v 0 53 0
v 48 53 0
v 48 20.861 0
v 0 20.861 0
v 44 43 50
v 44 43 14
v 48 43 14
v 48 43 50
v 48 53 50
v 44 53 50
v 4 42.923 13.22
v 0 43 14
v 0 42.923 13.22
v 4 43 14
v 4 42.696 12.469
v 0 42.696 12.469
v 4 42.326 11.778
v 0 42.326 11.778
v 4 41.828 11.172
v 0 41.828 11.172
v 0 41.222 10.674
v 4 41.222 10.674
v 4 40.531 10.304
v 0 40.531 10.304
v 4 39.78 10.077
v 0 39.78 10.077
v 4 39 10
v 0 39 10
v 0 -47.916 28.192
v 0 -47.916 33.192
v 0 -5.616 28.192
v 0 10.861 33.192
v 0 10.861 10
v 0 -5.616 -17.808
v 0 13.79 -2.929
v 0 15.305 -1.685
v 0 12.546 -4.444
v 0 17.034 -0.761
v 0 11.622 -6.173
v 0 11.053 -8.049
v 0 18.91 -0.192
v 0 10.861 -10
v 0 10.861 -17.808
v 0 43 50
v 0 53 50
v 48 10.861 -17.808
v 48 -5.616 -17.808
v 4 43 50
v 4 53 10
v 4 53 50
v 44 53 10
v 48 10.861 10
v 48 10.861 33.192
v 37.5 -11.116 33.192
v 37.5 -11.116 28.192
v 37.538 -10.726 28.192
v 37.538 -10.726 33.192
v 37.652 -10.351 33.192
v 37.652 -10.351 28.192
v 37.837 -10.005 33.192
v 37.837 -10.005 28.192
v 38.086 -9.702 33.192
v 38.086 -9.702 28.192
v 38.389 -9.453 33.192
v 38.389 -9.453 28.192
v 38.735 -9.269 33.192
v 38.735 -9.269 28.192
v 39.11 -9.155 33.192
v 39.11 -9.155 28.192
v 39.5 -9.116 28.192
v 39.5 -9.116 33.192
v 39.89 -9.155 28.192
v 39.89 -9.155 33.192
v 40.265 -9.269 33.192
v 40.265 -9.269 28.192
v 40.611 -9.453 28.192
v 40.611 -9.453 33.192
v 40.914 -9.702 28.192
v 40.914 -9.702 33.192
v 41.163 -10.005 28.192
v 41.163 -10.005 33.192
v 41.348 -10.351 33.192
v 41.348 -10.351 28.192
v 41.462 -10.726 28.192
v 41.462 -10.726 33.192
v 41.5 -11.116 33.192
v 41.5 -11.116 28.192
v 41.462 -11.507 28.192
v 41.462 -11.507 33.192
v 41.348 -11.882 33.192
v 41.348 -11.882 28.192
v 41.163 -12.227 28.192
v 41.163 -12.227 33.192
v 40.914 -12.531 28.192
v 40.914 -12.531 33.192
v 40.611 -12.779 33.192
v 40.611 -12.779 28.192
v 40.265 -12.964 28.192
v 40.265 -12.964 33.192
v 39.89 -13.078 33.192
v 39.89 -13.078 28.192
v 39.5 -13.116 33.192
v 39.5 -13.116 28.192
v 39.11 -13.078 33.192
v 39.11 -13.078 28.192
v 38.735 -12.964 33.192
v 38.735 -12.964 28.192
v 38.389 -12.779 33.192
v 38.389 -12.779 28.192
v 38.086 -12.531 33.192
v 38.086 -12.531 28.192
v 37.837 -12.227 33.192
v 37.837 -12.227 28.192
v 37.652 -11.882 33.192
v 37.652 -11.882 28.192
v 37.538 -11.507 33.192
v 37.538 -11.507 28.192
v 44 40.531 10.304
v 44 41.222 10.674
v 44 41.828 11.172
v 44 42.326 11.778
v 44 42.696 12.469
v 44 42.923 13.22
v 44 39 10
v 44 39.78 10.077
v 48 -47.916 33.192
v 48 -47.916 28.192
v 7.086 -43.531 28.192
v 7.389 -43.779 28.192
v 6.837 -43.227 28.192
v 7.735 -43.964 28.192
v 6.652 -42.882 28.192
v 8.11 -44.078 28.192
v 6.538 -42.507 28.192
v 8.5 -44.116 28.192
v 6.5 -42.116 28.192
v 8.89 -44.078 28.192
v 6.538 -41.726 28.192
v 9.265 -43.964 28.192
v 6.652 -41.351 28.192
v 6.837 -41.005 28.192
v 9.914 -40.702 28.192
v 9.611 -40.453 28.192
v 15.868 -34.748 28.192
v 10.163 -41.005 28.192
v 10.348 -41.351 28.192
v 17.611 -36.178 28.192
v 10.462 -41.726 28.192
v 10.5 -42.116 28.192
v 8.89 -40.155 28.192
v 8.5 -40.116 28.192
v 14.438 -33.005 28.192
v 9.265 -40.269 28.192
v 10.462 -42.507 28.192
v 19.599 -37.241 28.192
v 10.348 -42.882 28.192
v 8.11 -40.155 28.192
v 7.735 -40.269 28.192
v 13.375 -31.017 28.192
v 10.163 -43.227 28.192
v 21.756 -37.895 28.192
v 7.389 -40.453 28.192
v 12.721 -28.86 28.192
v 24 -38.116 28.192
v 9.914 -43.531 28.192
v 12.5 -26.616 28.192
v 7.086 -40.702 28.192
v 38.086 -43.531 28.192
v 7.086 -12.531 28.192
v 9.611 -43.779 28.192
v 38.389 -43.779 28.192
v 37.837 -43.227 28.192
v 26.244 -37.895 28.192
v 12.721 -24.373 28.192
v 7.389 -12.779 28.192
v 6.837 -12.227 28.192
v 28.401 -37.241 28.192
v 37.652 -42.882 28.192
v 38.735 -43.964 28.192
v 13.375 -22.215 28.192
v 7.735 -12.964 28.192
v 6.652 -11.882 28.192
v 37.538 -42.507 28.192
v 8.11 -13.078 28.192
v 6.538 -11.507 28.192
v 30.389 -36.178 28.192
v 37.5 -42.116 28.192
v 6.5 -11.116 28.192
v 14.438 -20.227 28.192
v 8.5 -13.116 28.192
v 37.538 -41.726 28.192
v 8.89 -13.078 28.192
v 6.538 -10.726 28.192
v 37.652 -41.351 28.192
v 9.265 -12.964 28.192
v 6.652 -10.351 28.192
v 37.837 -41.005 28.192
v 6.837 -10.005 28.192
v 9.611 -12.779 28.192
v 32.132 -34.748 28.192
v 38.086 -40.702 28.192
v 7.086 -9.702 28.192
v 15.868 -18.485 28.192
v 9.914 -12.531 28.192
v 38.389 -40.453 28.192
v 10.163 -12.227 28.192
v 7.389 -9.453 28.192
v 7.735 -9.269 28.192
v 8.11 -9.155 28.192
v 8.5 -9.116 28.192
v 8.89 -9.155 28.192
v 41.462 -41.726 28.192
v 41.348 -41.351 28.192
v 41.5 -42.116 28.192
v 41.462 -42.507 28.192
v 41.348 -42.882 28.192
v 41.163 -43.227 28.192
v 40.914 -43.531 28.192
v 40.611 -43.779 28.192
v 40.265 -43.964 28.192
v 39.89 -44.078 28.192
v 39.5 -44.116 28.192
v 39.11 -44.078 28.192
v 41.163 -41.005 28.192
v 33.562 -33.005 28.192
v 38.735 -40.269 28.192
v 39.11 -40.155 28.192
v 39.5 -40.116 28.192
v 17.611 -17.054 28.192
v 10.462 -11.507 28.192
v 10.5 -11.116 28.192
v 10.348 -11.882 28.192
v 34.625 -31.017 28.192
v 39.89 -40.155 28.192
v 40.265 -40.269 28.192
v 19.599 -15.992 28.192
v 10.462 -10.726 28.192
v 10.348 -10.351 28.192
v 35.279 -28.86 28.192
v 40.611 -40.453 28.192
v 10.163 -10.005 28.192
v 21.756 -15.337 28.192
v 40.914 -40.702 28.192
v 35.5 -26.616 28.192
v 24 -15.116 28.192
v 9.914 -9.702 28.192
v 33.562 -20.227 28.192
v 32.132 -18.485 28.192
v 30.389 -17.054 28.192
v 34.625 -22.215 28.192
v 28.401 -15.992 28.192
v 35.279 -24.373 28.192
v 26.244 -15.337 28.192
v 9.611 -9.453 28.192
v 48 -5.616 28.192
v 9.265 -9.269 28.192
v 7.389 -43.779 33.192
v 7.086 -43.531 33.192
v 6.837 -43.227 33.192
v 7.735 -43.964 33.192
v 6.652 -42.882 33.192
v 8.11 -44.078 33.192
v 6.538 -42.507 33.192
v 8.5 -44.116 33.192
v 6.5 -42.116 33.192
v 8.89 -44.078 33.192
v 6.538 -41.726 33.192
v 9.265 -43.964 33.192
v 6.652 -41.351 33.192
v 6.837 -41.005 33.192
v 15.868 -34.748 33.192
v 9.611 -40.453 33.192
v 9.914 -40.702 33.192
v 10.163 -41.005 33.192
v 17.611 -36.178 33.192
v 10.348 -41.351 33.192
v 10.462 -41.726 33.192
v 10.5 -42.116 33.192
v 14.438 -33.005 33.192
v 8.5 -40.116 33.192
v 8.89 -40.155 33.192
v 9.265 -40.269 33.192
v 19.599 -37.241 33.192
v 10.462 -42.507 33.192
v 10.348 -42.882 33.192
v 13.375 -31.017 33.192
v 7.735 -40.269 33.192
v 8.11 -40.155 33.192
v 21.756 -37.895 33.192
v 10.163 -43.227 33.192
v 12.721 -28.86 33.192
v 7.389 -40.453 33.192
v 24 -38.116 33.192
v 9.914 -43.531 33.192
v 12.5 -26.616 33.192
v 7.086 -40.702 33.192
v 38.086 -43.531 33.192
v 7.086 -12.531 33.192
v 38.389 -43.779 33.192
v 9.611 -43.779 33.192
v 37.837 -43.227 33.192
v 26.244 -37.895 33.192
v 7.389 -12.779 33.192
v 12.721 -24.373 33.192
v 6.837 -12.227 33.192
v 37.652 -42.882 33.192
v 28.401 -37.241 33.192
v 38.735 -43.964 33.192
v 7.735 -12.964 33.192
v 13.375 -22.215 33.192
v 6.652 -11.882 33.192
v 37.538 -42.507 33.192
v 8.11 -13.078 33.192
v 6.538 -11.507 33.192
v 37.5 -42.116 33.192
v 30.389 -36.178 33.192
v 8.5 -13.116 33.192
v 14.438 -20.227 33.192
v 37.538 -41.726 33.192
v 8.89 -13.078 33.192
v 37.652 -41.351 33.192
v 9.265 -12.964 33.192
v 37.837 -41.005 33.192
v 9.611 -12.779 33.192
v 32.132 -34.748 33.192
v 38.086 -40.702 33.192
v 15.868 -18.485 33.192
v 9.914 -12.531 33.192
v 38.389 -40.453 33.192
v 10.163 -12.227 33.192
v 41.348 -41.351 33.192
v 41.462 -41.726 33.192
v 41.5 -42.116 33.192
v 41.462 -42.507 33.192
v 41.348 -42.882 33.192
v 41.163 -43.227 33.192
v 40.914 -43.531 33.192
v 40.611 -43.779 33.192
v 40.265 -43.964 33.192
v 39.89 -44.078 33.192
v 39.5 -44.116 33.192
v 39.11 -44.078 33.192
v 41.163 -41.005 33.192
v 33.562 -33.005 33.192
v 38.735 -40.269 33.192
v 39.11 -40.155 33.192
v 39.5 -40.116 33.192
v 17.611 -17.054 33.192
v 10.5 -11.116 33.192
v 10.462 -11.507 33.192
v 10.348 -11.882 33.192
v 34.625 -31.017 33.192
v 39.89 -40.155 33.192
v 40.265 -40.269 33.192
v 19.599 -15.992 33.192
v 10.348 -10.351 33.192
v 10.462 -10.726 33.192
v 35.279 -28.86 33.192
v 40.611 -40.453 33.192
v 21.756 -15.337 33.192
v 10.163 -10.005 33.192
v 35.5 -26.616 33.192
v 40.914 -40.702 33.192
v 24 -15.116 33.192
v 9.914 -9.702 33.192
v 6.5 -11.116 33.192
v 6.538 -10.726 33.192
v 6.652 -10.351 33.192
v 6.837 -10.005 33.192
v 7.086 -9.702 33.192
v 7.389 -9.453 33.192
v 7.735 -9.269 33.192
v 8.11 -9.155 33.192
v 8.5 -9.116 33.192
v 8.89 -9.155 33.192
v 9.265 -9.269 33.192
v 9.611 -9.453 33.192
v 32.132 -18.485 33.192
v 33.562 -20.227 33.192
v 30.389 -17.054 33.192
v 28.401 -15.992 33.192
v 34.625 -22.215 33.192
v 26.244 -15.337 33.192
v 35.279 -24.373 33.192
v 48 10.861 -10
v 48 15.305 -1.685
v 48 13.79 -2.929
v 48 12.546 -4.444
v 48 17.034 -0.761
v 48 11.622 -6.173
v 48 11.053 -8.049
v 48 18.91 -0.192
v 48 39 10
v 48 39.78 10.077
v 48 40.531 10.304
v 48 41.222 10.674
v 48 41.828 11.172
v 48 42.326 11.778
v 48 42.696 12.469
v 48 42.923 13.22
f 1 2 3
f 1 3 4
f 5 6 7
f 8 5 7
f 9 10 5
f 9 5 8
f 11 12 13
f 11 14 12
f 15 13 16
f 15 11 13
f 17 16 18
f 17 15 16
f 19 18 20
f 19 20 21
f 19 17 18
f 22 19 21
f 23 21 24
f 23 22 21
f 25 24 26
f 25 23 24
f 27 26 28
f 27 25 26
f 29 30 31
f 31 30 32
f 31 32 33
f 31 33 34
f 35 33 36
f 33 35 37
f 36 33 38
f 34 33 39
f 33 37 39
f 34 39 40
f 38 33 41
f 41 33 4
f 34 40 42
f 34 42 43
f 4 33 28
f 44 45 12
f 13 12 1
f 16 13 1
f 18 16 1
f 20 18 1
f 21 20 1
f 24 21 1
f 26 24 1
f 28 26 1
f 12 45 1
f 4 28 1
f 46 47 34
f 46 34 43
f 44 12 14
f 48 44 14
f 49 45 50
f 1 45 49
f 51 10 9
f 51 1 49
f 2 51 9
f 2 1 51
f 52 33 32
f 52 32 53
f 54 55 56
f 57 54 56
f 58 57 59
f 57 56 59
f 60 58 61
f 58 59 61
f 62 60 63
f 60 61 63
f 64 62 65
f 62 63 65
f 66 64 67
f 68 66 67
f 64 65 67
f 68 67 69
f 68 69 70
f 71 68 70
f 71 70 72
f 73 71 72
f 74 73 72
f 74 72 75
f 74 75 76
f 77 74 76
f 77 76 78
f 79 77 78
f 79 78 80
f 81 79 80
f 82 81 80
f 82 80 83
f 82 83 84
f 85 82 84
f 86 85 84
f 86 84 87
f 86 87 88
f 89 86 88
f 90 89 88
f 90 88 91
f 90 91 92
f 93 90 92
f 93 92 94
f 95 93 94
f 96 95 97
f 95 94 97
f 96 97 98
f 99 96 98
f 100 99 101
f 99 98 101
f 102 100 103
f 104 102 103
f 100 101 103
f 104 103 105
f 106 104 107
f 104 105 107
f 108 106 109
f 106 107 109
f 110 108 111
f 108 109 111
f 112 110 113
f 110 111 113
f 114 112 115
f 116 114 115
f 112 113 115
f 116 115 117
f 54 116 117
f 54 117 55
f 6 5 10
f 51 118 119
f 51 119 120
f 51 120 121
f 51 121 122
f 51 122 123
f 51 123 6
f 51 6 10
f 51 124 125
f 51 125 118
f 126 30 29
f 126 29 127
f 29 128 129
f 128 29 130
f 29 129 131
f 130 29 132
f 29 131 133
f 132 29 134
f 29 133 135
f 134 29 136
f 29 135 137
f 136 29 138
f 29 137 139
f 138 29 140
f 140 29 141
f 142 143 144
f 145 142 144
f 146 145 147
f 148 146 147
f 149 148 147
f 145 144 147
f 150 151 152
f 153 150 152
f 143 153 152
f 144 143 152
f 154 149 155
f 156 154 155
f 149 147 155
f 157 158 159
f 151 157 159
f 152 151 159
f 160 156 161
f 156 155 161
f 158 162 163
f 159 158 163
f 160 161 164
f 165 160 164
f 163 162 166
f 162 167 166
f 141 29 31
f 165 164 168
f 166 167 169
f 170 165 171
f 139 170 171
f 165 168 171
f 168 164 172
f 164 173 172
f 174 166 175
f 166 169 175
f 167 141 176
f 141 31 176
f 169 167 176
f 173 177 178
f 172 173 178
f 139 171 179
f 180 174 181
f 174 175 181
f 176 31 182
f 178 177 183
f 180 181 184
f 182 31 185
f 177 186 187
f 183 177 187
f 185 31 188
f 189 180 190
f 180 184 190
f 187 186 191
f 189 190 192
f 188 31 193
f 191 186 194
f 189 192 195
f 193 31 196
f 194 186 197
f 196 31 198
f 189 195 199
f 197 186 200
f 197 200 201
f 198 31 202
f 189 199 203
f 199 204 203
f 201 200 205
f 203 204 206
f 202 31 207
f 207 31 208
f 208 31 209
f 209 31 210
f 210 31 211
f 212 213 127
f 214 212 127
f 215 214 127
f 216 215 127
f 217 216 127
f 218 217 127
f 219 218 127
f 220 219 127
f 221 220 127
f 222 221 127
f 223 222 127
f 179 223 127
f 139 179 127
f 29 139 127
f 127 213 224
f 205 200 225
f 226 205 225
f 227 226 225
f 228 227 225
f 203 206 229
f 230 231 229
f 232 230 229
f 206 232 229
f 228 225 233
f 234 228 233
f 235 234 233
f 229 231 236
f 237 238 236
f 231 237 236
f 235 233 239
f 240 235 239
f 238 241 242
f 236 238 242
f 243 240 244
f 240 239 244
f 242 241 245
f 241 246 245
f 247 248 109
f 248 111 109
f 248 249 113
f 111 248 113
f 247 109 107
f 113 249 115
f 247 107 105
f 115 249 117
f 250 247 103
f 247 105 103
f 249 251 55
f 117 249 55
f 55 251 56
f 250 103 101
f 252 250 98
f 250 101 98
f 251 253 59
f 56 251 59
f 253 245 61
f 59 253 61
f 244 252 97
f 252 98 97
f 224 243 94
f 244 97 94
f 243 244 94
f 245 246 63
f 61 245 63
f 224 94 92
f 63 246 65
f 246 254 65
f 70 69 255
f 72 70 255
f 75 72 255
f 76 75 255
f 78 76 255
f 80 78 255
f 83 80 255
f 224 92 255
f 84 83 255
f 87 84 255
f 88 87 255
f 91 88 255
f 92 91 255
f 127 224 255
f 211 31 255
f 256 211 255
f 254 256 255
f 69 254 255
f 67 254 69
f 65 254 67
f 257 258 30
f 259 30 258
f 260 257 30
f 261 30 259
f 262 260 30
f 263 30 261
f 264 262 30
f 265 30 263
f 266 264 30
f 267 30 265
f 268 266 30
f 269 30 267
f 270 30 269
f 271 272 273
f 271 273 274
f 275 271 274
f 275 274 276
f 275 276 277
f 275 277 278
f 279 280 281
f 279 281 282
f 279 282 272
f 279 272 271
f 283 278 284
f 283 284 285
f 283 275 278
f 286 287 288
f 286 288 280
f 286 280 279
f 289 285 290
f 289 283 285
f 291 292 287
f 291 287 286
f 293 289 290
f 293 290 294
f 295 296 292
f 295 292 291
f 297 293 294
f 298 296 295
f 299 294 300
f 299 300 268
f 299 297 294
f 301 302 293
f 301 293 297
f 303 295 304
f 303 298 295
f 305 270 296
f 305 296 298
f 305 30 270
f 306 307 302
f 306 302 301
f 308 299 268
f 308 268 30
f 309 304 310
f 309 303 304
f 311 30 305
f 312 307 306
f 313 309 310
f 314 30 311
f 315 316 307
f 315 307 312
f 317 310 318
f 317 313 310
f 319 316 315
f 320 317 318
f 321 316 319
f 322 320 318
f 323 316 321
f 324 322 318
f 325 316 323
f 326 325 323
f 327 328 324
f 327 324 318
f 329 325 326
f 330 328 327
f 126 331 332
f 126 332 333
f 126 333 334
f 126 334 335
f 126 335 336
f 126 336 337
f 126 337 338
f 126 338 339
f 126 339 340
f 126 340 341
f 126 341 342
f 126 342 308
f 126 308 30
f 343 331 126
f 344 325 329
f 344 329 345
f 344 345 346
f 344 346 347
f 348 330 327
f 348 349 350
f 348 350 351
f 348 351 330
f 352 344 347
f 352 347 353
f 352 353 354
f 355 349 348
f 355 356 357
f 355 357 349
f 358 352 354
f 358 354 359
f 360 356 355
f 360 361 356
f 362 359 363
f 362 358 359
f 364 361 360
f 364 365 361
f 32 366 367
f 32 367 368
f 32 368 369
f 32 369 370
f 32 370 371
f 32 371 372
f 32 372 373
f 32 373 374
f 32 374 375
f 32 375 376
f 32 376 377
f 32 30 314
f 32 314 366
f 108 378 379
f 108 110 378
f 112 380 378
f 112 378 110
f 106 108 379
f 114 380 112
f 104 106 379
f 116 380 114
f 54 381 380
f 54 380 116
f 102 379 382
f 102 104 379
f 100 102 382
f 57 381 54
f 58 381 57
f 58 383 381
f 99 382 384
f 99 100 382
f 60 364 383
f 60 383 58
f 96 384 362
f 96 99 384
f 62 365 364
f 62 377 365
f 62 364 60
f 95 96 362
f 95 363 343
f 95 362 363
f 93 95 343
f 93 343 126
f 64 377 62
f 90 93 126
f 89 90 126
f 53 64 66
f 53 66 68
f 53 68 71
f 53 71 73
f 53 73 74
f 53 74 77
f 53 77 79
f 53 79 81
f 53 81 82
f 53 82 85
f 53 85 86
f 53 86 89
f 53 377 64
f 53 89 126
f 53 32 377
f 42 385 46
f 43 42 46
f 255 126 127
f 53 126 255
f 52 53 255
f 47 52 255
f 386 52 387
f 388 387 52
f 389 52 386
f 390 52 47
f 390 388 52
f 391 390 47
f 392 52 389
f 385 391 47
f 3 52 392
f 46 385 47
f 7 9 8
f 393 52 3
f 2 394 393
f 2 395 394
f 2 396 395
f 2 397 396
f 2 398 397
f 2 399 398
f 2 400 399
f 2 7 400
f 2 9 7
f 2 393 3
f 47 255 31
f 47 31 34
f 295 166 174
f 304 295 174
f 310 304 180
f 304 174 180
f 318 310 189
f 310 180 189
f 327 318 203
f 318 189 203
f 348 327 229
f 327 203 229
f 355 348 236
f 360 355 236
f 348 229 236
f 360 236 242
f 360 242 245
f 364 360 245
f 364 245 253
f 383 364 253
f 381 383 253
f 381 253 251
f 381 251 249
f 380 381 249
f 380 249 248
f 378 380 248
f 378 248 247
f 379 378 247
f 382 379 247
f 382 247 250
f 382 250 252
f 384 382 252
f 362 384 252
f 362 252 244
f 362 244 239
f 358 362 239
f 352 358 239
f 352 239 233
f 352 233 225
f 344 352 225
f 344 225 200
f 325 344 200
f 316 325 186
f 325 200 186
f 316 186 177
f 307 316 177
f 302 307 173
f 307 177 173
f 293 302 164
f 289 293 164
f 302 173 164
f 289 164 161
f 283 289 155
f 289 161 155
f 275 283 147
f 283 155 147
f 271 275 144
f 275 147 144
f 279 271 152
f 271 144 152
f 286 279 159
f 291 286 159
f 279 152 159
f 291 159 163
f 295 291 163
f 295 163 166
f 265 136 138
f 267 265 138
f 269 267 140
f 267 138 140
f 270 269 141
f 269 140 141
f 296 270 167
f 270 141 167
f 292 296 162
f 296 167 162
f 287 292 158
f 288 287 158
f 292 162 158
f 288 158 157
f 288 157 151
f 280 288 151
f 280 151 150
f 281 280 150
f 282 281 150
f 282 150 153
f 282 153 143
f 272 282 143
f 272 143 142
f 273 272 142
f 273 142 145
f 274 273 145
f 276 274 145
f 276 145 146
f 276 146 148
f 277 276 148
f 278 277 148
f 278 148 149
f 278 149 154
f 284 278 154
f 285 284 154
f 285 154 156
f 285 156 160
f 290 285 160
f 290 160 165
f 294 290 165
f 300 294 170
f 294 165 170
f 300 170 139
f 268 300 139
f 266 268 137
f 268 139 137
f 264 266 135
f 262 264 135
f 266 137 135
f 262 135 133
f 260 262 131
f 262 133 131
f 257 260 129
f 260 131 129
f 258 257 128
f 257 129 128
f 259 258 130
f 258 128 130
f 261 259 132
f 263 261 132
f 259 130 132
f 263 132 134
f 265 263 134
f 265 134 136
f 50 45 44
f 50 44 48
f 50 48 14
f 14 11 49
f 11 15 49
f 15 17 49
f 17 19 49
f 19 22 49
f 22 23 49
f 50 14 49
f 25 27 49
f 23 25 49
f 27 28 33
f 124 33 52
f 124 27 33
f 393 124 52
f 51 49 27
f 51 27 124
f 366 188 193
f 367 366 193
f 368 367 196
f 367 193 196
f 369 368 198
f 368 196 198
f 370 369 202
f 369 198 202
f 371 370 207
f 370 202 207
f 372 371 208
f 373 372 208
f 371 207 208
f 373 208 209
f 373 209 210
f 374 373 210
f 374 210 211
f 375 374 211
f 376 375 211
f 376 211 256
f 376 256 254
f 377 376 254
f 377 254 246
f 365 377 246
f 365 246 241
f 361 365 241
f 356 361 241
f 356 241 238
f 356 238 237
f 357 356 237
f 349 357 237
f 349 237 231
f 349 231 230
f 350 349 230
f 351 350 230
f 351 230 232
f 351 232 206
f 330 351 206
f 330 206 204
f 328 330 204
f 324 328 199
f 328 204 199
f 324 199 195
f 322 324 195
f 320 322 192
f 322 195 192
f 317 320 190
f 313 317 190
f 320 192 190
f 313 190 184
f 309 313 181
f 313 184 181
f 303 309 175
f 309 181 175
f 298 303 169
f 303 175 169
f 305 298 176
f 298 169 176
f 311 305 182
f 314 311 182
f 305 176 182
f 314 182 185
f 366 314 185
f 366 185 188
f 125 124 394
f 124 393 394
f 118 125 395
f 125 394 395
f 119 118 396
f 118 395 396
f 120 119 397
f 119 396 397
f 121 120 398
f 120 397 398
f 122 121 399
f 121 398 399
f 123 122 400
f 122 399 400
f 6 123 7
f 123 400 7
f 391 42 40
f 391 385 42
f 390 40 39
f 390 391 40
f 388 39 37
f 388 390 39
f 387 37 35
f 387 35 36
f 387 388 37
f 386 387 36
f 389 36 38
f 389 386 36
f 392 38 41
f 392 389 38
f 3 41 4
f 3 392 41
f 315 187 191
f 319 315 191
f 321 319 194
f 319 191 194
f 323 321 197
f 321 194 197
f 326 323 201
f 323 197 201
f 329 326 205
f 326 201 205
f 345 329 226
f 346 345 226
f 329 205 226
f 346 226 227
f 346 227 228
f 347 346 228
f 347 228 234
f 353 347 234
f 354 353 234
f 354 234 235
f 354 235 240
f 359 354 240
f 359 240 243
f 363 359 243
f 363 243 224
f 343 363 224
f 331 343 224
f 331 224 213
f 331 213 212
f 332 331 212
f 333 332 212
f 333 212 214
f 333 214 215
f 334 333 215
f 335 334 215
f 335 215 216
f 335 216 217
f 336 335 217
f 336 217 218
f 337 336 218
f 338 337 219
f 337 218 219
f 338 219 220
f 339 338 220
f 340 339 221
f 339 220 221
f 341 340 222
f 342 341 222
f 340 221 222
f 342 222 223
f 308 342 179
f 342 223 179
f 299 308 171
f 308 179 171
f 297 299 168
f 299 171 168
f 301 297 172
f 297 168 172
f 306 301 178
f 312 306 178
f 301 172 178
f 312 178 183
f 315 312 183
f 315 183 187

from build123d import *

# Parameters (mm, degrees)
SKETCH1_W           = 48
SKETCH1_H           = 53
BOSS_EXTRUDE1_DEPTH = 10
SKETCH2_W           = 48
SKETCH2_H           = 5.616325
BOSS_EXTRUDE2_DEPTH = 33.1917878
SKETCH4_W           = 4
SKETCH4_H           = 10
BOSS_EXTRUDE4_DEPTH = 40
SKETCH5_W           = 48
SKETCH5_H           = 10.8609375
BOSS_EXTRUDE5_DEPTH = 23.1917878
SKETCH6_W           = 48
SKETCH6_H           = 5
BOSS_EXTRUDE6_DEPTH = 42.3
SKETCH7_W           = 12.8082122
SKETCH7_H           = 16.4772625
BOSS_EXTRUDE7_DEPTH = 48
CUT_EXTRUDE1_REACH  = 84.426
SKETCH8_R           = 11.5
SKETCH8_R_2         = 2
FILLET1_R           = 10
FILLET2_R           = 4
SKETCH9_W           = 5
SKETCH9_H           = 16.4772625
BOSS_EXTRUDE9_DEPTH = 48


with BuildPart() as part:
    # Sketch1 → Boss-Extrude1 (new body)
    with BuildSketch(Plane.XY):
        with Locations((24, 26.5)):
            Rectangle(SKETCH1_W, SKETCH1_H)
    extrude(amount=BOSS_EXTRUDE1_DEPTH)

    # Sketch2 → Boss-Extrude2 (add)
    with BuildSketch(Plane(origin=(0, 0, 0), x_dir=(-1, 0, 0), z_dir=(0, 0, -1))):
        with Locations((-24, -2.8081625)):
            Rectangle(SKETCH2_W, SKETCH2_H)
    extrude(amount=-BOSS_EXTRUDE2_DEPTH)

    # Sketch4 → Boss-Extrude4 (add)
    with BuildSketch(Plane.XY.offset(10)):
        with Locations((2, 48)):
            Rectangle(SKETCH4_W, SKETCH4_H)
        with Locations((46, 48)):
            Rectangle(SKETCH4_W, SKETCH4_H)
    extrude(amount=BOSS_EXTRUDE4_DEPTH)

    # Sketch5 → Boss-Extrude5 (add)
    with BuildSketch(Plane.XY.offset(10)):
        with Locations((24, 5.43046875)):
            Rectangle(SKETCH5_W, SKETCH5_H)
    extrude(amount=BOSS_EXTRUDE5_DEPTH)

    # Sketch6 → Boss-Extrude6 (add)
    with BuildSketch(Plane.XZ.offset(5.616325)):
        with Locations((24, 30.6917878)):
            Rectangle(SKETCH6_W, SKETCH6_H)
    extrude(amount=BOSS_EXTRUDE6_DEPTH)

    # Sketch7 → Boss-Extrude7 (add)
    with BuildSketch(Plane.ZY):
        with Locations((-6.4041061, 2.62230625)):
            Rectangle(SKETCH7_W, SKETCH7_H)
    extrude(amount=-BOSS_EXTRUDE7_DEPTH)

    # Sketch8 → Cut-Extrude1 (cut, up to next)
    with BuildSketch(Plane(origin=(0, 0, 28.1917878), x_dir=(-1, 0, 0), z_dir=(0, 0, -1)), mode=Mode.PRIVATE) as cut_extrude1_sk1:
        with Locations((-24, -26.616325)):
            Circle(SKETCH8_R)
    cut_extrude1_tool1 = extrude(cut_extrude1_sk1.sketch, amount=-CUT_EXTRUDE1_REACH, mode=Mode.PRIVATE) & part.part
    # Sketch8 → Cut-Extrude1 (cut, up to next)
    with BuildSketch(Plane(origin=(0, 0, 28.1917878), x_dir=(-1, 0, 0), z_dir=(0, 0, -1)), mode=Mode.PRIVATE) as cut_extrude1_sk2:
        with Locations((-39.5, -11.116325)):
            Circle(SKETCH8_R_2)
    cut_extrude1_tool2 = extrude(cut_extrude1_sk2.sketch, amount=-CUT_EXTRUDE1_REACH, mode=Mode.PRIVATE) & part.part
    # Sketch8 → Cut-Extrude1 (cut, up to next)
    with BuildSketch(Plane(origin=(0, 0, 28.1917878), x_dir=(-1, 0, 0), z_dir=(0, 0, -1)), mode=Mode.PRIVATE) as cut_extrude1_sk3:
        with Locations((-39.5, -42.116325)):
            Circle(SKETCH8_R_2)
    cut_extrude1_tool3 = extrude(cut_extrude1_sk3.sketch, amount=-CUT_EXTRUDE1_REACH, mode=Mode.PRIVATE) & part.part
    # Sketch8 → Cut-Extrude1 (cut, up to next)
    with BuildSketch(Plane(origin=(0, 0, 28.1917878), x_dir=(-1, 0, 0), z_dir=(0, 0, -1)), mode=Mode.PRIVATE) as cut_extrude1_sk4:
        with Locations((-8.5, -11.116325)):
            Circle(SKETCH8_R_2)
    cut_extrude1_tool4 = extrude(cut_extrude1_sk4.sketch, amount=-CUT_EXTRUDE1_REACH, mode=Mode.PRIVATE) & part.part
    # Sketch8 → Cut-Extrude1 (cut, up to next)
    with BuildSketch(Plane(origin=(0, 0, 28.1917878), x_dir=(-1, 0, 0), z_dir=(0, 0, -1)), mode=Mode.PRIVATE) as cut_extrude1_sk5:
        with Locations((-8.5, -42.116325)):
            Circle(SKETCH8_R_2)
    cut_extrude1_tool5 = extrude(cut_extrude1_sk5.sketch, amount=-CUT_EXTRUDE1_REACH, mode=Mode.PRIVATE) & part.part
    add(cut_extrude1_tool1.solids().sort_by_distance((24, -26.616325, 28.191788))[0], mode=Mode.SUBTRACT)
    add(cut_extrude1_tool2.solids().sort_by_distance((39.5, -11.116325, 28.191788))[0], mode=Mode.SUBTRACT)
    add(cut_extrude1_tool3.solids().sort_by_distance((39.5, -42.116325, 28.191788))[0], mode=Mode.SUBTRACT)
    add(cut_extrude1_tool4.solids().sort_by_distance((8.5, -11.116325, 28.191788))[0], mode=Mode.SUBTRACT)
    add(cut_extrude1_tool5.solids().sort_by_distance((8.5, -42.116325, 28.191788))[0], mode=Mode.SUBTRACT)

    # Fillet1
    fillet1_edges = [part.edges().sort_by_distance(p)[0] for p in [
        (24, 10.8609375, 0),
    ]]
    fillet(fillet1_edges, radius=FILLET1_R)

    # Fillet2
    fillet2_edges = [part.edges().sort_by_distance(p)[0] for p in [
        (2, 43, 10),
        (46, 43, 10),
    ]]
    fillet(fillet2_edges, radius=FILLET2_R)

    # Sketch9 → Boss-Extrude9 (add)
    with BuildSketch(Plane(origin=(48, 0, 0), x_dir=(0, 0, -1), z_dir=(1, 0, 0))):
        with Locations((15.3082122, 2.62230625)):
            Rectangle(SKETCH9_W, SKETCH9_H)
    extrude(amount=-BOSS_EXTRUDE9_DEPTH)


solid = part.part
